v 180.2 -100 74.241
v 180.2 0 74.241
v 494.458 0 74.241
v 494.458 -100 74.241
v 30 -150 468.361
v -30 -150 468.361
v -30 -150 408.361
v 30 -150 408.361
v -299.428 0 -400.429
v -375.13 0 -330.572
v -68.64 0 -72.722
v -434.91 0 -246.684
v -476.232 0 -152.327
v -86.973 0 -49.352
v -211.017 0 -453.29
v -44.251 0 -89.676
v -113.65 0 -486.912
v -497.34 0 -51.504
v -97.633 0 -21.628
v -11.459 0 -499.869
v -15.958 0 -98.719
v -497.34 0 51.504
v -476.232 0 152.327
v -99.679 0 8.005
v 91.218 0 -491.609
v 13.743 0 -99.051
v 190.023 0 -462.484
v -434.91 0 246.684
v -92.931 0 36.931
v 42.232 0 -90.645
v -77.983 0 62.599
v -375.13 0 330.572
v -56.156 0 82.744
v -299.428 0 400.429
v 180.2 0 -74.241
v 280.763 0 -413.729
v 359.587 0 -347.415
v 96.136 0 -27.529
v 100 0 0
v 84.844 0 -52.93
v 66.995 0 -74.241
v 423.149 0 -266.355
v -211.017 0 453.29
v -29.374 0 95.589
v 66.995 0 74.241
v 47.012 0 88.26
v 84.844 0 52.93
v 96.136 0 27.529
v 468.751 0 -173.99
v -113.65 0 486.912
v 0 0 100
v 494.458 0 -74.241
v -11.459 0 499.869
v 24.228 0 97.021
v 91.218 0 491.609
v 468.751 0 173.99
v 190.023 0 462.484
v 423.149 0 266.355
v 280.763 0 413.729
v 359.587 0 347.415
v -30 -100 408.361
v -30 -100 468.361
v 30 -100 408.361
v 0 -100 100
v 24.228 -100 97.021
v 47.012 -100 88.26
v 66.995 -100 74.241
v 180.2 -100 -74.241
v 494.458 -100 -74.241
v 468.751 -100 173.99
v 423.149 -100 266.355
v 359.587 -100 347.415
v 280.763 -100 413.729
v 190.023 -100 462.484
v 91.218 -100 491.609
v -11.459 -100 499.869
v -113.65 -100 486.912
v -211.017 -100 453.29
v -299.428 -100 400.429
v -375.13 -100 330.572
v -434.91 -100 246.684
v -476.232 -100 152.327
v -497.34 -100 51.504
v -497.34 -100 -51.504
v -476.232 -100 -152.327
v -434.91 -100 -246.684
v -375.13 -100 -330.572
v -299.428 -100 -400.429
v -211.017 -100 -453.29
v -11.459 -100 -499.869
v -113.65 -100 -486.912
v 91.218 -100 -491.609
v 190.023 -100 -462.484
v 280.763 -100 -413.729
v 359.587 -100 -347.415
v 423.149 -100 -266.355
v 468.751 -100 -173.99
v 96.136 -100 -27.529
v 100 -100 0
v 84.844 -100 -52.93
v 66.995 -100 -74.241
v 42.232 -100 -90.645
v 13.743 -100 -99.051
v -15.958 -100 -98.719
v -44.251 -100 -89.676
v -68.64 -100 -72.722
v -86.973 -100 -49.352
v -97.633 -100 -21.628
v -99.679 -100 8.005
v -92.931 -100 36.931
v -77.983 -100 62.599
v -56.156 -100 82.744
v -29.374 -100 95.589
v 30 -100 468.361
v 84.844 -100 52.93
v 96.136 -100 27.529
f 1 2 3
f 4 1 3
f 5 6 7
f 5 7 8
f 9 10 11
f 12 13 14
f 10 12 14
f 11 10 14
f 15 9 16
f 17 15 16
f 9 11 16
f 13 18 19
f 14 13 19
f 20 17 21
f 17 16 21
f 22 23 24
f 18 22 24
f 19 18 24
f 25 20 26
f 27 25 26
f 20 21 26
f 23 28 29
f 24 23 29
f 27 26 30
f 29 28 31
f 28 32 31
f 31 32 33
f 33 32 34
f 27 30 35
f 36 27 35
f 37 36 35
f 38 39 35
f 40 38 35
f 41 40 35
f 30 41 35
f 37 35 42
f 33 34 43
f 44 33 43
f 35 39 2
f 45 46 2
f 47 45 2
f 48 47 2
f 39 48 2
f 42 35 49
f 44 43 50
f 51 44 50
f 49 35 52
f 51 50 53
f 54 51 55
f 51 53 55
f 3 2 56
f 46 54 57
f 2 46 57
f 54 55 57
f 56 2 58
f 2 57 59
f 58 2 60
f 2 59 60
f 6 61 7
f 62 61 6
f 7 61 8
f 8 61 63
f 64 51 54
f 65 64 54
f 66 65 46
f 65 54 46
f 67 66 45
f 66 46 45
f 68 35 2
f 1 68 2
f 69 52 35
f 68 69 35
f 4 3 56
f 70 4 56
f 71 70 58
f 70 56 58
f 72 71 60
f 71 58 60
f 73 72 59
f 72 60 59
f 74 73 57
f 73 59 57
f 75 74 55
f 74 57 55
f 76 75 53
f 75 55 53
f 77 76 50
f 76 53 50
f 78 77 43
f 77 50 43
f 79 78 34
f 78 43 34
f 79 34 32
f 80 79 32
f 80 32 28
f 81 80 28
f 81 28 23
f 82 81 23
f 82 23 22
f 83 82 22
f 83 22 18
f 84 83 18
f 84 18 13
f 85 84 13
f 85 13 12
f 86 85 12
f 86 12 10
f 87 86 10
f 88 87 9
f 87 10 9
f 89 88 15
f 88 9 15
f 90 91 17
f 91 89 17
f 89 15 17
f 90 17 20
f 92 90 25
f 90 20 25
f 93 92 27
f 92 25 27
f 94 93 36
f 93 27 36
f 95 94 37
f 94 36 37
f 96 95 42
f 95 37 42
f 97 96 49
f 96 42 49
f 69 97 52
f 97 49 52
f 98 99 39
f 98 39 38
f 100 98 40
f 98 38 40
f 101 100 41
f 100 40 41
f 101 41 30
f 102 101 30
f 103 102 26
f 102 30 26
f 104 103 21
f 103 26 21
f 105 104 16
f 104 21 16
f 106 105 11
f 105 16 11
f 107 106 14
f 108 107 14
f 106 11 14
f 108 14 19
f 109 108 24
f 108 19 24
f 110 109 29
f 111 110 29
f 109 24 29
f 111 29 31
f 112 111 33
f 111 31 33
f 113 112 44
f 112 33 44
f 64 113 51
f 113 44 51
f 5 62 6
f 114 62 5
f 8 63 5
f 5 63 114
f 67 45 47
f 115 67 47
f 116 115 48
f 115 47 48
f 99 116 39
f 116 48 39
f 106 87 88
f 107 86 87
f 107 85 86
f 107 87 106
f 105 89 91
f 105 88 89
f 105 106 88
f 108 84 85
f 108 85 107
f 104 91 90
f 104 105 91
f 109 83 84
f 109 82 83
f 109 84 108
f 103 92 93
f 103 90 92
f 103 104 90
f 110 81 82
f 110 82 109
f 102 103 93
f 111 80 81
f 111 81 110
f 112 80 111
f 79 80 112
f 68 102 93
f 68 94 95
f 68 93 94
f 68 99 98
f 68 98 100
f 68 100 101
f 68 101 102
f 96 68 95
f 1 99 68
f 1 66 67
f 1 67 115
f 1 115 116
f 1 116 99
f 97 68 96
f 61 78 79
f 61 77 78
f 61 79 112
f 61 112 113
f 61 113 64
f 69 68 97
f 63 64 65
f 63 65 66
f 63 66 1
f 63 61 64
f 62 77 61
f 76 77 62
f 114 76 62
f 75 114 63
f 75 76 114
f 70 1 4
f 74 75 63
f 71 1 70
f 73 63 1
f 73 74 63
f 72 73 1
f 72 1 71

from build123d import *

# Parameters (mm, degrees)
F0_W     = 30
F0_H     = 60
F1_DEPTH = 100
F2_DEPTH = 102
F4_DEPTH = 100
F5_DEPTH = 150


# Not quite as in the source:
# - a feature of the source that left no trace in its solid (it failed there, or was rolled back) is left out
# - a feature names something its author has since deleted; it is built from what else it names


with BuildPart() as f1:
    # F0 (on Front) → F1 (new body)
    with BuildSketch(Plane.XZ):
        with BuildLine():
            Line((180.2002936602, 74.2409452796), (494.457563441, 74.2409452796))
            ThreePointArc((494.457563441, 74.2409452796), (326.2510746037, 378.8934366282), (0, 500))
            Line((0, 500), (0, 468.3614957333))
            Line((0, 468.3614957333), (30, 468.3614957333))
            Line((30, 468.3614957333), (30, 408.3614957333))
            Line((30, 408.3614957333), (0, 408.3614957333))
            Line((0, 408.3614957333), (0, 100))
            ThreePointArc((0, 100), (35.8880584042, 93.3383483033), (66.9946419051, 74.2409452796))
            Line((66.9946419051, 74.2409452796), (180.2002936602, 74.2409452796))
        make_face()
        with BuildLine():
            ThreePointArc((0, 500), (-378.8934366282, -326.2510746037), (494.457563441, -74.2409452796))
            Line((494.457563441, -74.2409452796), (180.2002936602, -74.2409452796))
            Line((180.2002936602, -74.2409452796), (66.9946419051, -74.2409452796))
            ThreePointArc((66.9946419051, -74.2409452796), (-93.3383483033, -35.8880584042), (0, 100))
            Line((0, 100), (0, 408.3614957333))
            Line((0, 408.3614957333), (-30, 408.3614957333))
            Line((-30, 408.3614957333), (-30, 468.3614957333))
            Line((-30, 468.3614957333), (0, 468.3614957333))
            Line((0, 468.3614957333), (0, 500))
        make_face()
        with BuildLine():
            Line((180.2002936602, -74.2409452796), (180.2002936602, 74.2409452796))
            Line((180.2002936602, 74.2409452796), (66.9946419051, 74.2409452796))
            ThreePointArc((66.9946419051, 74.2409452796), (91.3768684912, 40.6234895688), (100, 0))
            ThreePointArc((100, 0), (91.3768684912, -40.6234895688), (66.9946419051, -74.2409452796))
            Line((66.9946419051, -74.2409452796), (180.2002936602, -74.2409452796))
        make_face()
        with Locations((-15, 438.3614957333)):
            Rectangle(F0_W, F0_H)
    extrude(amount=F1_DEPTH)

    # F0 (on Front) → F2 (join)
    with BuildSketch(Plane.XZ):
        with Locations((15, 438.3614957333)):
            Rectangle(F0_W, F0_H)
    extrude(amount=F2_DEPTH)

    # F0 (on Front) → F4 (join)
    with BuildSketch(Plane.XZ):
        with BuildLine():
            Line((180.2002936602, 74.2409452796), (494.457563441, 74.2409452796))
            ThreePointArc((494.457563441, 74.2409452796), (326.2510746037, 378.8934366282), (0, 500))
            Line((0, 500), (0, 468.3614957333))
            Line((0, 468.3614957333), (30, 468.3614957333))
            Line((30, 468.3614957333), (30, 408.3614957333))
            Line((30, 408.3614957333), (0, 408.3614957333))
            Line((0, 408.3614957333), (0, 100))
            ThreePointArc((0, 100), (35.8880584042, 93.3383483033), (66.9946419051, 74.2409452796))
            Line((66.9946419051, 74.2409452796), (180.2002936602, 74.2409452796))
        make_face()
    extrude(amount=F4_DEPTH)

    # F0 (on Front) → F5 (join)
    with BuildSketch(Plane.XZ):
        with Locations((-15, 438.3614957333)):
            Rectangle(F0_W, F0_H)
        with Locations((15, 438.3614957333)):
            Rectangle(F0_W, F0_H)
    extrude(amount=F5_DEPTH)


solid = f1.part
